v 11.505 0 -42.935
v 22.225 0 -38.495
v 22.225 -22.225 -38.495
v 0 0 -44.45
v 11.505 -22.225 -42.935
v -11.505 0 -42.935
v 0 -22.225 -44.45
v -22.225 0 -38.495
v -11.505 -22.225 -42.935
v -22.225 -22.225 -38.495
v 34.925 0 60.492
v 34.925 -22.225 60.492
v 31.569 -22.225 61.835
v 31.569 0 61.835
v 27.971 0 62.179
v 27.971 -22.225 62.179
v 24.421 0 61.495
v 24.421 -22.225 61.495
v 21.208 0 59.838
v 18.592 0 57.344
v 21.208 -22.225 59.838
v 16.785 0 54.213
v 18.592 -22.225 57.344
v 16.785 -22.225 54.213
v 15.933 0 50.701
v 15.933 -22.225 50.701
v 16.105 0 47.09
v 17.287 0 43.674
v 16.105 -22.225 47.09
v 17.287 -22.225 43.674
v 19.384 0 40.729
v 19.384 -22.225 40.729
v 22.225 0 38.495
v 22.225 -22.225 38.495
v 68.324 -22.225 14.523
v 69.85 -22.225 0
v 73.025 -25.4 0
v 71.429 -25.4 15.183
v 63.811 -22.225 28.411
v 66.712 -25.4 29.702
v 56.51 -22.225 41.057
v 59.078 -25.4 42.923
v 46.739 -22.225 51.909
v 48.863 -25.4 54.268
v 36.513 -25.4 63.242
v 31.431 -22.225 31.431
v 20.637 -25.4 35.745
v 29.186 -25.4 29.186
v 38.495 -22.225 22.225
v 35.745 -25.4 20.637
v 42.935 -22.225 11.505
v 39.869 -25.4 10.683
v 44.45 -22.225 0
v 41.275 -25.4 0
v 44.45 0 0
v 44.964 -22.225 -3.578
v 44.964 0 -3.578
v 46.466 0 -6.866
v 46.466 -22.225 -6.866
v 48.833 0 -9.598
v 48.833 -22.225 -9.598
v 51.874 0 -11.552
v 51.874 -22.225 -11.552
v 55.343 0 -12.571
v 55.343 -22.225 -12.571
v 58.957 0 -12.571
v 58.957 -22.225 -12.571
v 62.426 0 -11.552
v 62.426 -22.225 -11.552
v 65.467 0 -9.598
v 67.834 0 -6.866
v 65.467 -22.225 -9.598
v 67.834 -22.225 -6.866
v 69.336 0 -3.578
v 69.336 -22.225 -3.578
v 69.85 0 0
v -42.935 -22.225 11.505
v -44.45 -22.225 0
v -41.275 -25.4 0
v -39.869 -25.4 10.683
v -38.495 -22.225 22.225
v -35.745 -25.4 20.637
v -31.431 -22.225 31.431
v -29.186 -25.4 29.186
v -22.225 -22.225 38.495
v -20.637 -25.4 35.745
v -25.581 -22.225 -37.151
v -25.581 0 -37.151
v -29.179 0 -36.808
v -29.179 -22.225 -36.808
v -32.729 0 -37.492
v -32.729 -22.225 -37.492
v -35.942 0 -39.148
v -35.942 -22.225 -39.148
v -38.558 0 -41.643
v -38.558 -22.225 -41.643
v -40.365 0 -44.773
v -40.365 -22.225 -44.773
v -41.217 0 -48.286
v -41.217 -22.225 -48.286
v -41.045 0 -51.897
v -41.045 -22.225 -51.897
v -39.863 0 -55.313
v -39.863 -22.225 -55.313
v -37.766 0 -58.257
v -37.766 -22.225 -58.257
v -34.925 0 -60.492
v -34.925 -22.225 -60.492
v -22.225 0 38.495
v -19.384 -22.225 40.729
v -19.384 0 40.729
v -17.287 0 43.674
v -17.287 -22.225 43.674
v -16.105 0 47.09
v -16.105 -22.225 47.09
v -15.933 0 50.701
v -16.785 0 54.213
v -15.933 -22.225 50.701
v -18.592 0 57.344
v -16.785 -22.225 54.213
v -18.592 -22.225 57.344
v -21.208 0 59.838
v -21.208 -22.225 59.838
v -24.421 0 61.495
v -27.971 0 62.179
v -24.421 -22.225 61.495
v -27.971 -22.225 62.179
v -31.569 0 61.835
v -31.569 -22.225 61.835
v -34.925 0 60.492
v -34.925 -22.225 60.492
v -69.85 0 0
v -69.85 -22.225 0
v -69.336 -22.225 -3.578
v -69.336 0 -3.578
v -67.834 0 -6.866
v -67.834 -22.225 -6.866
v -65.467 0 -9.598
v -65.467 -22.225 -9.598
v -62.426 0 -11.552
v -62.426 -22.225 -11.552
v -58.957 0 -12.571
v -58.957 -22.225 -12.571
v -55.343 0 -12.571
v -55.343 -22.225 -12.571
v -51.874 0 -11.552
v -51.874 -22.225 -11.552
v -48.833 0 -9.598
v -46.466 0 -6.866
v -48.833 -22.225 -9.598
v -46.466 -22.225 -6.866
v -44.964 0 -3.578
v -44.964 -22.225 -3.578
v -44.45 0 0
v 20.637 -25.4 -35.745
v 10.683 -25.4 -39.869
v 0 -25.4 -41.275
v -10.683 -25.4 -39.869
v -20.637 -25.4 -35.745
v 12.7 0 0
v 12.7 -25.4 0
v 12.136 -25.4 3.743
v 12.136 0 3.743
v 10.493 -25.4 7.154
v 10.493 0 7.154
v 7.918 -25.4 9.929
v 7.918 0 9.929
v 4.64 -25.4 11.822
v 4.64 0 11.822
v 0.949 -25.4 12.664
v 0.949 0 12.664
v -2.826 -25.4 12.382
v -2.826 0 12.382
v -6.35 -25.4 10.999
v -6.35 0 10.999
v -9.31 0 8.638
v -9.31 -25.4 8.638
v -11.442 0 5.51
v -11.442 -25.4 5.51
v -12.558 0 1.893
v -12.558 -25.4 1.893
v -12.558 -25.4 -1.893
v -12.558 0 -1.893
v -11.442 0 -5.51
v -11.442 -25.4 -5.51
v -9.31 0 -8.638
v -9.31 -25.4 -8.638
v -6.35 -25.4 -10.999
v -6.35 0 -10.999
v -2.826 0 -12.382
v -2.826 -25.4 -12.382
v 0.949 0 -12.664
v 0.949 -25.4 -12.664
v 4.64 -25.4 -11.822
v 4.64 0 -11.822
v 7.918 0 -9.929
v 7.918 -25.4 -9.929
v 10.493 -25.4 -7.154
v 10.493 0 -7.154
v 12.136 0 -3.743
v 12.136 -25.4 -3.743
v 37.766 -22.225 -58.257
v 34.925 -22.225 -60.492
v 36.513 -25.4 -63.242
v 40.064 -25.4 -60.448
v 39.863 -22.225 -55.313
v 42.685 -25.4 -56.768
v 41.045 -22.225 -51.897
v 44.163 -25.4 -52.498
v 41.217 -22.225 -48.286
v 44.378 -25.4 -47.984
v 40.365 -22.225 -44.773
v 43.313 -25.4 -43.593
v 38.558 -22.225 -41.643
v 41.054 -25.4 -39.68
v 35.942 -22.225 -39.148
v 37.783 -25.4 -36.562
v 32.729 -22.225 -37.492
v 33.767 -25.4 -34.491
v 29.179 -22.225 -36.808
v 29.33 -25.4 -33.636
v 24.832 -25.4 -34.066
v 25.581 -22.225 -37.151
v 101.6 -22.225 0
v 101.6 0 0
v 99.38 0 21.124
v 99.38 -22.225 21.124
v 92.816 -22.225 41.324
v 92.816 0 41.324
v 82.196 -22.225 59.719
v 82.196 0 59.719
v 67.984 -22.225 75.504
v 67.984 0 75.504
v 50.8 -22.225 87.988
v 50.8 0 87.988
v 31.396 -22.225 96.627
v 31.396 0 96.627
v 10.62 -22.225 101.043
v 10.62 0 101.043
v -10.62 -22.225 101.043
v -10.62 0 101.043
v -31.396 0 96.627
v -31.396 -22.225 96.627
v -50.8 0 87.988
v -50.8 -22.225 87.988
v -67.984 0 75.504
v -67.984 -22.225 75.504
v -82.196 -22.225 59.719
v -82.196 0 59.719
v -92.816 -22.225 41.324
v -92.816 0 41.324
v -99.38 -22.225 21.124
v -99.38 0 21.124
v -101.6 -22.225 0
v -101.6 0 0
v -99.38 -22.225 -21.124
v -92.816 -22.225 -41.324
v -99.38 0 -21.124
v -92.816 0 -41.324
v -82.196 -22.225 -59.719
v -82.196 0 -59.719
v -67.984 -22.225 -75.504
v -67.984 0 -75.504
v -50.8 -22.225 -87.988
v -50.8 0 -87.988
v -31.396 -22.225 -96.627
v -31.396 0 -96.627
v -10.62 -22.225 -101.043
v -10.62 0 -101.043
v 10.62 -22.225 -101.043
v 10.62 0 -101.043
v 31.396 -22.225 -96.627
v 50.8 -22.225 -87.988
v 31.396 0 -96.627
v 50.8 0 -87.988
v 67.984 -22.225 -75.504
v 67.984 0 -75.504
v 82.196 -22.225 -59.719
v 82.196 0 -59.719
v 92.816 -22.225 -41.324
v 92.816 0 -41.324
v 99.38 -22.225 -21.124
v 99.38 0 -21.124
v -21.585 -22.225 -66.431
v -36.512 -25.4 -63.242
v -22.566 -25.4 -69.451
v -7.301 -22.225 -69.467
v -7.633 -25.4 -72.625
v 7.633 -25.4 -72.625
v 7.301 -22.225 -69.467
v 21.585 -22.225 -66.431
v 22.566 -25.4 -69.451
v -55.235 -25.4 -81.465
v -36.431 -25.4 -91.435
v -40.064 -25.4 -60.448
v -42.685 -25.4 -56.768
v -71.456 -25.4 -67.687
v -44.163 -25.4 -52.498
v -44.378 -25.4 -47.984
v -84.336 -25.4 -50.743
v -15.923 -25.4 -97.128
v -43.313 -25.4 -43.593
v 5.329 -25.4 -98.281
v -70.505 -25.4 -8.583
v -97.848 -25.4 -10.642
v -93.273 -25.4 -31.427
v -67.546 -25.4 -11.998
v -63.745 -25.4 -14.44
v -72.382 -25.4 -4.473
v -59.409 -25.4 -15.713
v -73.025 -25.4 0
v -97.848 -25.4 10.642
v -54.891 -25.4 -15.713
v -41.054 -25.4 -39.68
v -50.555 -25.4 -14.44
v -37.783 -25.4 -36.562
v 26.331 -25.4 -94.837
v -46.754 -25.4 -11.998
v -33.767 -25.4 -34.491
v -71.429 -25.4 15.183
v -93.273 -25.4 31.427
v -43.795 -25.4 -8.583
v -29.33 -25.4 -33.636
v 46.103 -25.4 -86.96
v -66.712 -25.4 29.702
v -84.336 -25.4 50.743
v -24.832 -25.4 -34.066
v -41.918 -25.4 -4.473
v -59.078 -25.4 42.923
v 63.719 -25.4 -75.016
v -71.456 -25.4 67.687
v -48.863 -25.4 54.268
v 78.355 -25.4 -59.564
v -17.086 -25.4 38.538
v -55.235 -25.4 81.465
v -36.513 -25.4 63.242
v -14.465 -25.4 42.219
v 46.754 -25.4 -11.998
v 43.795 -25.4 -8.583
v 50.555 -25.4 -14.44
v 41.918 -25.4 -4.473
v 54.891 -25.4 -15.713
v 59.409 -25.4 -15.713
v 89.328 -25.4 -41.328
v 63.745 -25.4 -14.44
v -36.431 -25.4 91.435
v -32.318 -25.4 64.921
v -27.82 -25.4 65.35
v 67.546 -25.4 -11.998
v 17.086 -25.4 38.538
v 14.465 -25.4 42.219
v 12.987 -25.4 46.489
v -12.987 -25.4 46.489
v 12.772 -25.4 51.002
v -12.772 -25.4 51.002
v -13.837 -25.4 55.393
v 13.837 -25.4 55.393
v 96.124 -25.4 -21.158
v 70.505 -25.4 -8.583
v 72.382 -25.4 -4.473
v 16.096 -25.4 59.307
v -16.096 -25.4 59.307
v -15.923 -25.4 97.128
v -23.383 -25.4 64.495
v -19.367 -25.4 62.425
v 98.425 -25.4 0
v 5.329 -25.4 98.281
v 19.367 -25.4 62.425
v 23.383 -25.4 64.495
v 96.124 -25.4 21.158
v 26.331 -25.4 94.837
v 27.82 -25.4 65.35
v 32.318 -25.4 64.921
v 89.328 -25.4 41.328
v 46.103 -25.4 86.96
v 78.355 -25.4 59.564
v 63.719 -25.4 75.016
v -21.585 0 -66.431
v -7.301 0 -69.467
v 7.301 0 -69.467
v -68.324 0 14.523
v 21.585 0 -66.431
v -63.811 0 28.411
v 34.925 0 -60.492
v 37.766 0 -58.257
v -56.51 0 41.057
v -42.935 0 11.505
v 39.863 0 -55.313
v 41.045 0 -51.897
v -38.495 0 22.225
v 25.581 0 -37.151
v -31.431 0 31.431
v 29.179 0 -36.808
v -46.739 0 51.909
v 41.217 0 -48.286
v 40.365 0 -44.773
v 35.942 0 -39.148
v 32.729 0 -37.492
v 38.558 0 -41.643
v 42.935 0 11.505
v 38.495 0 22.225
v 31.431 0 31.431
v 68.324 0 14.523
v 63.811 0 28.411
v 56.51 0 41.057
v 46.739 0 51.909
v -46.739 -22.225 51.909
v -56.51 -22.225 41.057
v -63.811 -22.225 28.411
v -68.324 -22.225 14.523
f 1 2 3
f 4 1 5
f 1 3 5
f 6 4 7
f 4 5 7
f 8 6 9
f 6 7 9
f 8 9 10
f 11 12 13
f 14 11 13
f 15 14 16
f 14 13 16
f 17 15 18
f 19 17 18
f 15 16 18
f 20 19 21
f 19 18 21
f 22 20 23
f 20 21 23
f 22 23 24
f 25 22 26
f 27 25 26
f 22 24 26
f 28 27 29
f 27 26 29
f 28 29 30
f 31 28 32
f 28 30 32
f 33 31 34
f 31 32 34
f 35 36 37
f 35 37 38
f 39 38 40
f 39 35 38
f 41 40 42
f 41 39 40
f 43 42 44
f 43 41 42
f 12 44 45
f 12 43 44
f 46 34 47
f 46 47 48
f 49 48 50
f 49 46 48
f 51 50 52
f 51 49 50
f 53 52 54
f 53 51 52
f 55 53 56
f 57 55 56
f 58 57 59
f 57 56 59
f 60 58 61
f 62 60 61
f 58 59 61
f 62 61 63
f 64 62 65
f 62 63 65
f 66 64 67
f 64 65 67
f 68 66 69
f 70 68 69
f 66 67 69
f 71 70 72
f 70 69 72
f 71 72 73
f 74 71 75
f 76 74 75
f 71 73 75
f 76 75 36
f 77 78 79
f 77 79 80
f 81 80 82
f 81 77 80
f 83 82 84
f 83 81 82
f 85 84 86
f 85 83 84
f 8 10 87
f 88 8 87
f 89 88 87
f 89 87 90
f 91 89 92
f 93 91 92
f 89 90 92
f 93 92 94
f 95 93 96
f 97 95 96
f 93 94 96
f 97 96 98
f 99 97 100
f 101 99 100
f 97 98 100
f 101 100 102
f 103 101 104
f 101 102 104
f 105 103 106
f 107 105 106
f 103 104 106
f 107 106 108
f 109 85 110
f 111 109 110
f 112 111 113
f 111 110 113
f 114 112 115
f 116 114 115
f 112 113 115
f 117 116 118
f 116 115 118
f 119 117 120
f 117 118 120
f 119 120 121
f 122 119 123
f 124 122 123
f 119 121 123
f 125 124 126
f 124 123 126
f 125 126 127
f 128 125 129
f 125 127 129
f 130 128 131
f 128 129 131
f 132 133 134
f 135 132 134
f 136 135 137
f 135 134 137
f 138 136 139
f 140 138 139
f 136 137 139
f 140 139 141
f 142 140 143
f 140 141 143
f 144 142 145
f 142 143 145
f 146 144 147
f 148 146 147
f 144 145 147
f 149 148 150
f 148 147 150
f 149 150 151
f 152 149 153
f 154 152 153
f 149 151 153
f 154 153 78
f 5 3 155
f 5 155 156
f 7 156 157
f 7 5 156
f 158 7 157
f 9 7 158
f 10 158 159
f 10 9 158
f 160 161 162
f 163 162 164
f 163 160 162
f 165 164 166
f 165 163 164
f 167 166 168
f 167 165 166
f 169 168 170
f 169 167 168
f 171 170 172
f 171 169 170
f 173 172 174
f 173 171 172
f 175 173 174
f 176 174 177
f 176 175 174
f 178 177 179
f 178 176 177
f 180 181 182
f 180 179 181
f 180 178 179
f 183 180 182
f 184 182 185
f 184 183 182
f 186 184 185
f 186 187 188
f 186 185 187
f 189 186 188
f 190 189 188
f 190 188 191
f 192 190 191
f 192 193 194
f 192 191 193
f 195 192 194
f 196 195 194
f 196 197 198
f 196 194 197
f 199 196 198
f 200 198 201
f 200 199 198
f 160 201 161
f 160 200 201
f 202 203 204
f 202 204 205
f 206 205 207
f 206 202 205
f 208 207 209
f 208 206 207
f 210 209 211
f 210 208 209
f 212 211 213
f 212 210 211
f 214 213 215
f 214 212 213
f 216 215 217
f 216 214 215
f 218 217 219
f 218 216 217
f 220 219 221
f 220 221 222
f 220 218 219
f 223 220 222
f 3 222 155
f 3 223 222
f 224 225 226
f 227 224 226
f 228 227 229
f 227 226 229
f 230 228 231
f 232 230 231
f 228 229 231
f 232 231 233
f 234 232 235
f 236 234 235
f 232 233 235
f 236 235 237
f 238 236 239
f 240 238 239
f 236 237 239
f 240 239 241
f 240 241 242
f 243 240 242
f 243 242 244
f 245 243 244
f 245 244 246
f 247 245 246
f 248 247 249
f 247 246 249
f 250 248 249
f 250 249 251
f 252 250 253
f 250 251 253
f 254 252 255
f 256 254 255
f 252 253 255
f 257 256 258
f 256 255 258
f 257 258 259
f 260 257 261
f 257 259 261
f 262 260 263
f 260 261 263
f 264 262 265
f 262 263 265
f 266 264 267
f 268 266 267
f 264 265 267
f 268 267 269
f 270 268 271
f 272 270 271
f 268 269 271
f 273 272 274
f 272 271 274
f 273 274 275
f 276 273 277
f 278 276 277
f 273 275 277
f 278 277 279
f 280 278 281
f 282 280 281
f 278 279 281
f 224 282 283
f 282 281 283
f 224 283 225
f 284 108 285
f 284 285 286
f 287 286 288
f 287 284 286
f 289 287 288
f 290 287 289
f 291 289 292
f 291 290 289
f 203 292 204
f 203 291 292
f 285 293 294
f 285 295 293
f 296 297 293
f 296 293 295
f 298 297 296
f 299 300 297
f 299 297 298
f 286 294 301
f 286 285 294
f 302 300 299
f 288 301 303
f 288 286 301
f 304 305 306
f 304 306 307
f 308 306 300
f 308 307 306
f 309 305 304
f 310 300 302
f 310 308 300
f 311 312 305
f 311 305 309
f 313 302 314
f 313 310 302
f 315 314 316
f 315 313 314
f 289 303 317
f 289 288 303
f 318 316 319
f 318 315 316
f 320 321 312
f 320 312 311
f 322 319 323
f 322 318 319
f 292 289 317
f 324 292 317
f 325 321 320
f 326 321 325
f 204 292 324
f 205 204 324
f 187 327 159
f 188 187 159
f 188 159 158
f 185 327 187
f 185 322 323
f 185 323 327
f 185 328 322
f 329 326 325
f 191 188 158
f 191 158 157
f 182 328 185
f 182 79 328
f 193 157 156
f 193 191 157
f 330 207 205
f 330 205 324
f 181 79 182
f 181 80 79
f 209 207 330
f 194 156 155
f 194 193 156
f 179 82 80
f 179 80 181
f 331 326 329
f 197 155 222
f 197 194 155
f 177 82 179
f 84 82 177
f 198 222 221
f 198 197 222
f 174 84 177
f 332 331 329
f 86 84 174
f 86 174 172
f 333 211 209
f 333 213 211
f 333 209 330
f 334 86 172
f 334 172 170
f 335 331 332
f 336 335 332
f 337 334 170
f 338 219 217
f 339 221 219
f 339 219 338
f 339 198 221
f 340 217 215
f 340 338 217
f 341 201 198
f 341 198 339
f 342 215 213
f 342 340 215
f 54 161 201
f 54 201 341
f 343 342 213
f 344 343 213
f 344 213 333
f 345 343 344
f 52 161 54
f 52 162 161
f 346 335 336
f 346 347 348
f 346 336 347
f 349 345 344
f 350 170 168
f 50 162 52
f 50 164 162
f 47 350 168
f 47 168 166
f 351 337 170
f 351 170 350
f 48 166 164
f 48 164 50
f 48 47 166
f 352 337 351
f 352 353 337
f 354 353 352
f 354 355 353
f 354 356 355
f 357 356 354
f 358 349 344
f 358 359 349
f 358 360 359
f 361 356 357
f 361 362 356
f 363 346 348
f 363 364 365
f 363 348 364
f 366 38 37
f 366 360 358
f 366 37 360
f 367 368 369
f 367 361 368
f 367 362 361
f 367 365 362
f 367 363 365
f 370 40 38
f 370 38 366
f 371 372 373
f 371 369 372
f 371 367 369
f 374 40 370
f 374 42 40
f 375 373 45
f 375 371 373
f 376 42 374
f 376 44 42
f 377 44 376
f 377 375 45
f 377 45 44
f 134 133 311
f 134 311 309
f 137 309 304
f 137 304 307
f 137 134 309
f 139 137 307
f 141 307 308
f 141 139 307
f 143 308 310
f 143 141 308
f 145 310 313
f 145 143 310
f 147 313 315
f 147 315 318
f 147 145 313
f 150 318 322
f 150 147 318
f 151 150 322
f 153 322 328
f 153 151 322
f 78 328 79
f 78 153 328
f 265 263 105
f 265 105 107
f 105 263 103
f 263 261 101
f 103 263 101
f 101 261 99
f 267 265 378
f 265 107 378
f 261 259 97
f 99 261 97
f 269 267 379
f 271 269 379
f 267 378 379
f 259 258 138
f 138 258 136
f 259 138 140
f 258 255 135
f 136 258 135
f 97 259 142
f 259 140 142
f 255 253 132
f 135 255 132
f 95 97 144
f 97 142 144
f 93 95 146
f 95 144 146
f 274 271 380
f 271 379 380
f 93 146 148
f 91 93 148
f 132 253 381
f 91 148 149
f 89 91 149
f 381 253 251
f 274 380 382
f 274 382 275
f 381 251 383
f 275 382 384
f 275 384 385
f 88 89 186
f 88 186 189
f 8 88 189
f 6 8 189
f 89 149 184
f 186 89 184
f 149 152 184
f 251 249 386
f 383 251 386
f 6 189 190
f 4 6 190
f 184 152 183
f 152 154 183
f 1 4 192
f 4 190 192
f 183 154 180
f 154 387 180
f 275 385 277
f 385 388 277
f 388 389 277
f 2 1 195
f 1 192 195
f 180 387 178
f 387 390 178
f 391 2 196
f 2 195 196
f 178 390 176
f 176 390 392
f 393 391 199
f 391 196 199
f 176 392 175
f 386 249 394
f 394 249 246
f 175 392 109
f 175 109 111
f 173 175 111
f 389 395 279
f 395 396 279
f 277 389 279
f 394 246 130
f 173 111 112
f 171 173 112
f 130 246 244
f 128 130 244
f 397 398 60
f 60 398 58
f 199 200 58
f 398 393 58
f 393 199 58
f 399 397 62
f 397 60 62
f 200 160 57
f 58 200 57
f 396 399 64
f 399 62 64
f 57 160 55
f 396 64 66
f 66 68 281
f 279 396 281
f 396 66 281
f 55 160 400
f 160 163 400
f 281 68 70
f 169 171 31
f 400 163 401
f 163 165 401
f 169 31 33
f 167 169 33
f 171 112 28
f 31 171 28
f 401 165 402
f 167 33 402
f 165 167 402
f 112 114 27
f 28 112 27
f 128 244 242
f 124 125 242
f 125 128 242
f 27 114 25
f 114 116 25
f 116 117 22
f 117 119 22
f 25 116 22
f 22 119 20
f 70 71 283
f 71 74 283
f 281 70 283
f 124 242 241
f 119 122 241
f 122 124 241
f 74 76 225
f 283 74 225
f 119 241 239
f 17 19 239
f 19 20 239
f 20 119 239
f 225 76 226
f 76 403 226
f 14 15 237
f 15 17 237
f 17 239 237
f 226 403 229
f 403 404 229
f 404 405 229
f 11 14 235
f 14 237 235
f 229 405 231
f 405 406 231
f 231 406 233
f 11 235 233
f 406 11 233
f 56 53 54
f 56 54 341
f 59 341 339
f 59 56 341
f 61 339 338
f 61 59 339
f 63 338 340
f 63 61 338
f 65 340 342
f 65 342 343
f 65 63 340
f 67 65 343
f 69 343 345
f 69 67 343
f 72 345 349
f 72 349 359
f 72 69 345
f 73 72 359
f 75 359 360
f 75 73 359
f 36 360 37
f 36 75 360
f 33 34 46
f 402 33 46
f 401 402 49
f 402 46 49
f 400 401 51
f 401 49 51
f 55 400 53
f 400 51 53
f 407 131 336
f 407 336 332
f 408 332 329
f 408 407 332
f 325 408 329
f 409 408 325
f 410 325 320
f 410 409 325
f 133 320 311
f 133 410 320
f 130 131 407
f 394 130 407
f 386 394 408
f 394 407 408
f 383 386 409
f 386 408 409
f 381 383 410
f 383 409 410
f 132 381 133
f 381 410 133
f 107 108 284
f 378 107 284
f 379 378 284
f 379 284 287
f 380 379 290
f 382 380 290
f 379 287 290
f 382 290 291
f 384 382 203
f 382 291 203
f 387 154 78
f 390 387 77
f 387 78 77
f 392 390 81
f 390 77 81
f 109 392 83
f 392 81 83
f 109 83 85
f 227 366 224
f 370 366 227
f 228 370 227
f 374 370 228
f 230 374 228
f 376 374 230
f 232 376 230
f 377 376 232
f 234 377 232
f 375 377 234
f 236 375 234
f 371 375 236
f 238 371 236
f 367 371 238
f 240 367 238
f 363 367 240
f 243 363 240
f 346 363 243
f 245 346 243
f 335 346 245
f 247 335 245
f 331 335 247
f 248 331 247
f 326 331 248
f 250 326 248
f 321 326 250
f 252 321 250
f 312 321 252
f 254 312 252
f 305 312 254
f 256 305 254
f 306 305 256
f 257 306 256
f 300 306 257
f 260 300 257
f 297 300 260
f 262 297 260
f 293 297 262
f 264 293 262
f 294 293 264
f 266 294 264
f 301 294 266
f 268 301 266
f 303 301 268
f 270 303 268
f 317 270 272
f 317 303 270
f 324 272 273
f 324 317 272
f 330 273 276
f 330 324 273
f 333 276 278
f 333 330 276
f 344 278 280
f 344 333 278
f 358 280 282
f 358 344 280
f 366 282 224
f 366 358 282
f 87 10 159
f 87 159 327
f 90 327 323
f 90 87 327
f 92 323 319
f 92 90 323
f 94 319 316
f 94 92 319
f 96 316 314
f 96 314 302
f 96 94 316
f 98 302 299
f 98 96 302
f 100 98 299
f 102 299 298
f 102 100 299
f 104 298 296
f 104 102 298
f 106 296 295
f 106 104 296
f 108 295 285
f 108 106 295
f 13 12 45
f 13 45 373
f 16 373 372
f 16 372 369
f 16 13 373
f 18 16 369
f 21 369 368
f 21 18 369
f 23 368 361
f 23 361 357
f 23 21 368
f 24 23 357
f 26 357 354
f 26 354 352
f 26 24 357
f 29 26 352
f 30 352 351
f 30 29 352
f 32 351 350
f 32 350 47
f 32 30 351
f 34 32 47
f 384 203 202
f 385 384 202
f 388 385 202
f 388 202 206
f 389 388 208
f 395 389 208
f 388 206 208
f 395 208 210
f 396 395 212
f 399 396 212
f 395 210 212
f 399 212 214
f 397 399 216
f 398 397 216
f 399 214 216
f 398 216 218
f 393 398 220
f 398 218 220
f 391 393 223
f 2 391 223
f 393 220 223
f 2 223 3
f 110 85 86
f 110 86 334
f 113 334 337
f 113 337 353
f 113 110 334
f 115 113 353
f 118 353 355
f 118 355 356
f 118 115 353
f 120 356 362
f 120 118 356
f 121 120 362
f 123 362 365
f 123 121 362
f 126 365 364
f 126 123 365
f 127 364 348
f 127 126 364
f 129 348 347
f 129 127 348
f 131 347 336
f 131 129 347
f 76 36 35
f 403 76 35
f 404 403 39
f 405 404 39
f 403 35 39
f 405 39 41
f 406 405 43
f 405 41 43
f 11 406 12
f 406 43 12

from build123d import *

# Parameters (mm, degrees)
F0_R     = 101.6
F2_DEPTH = 25.4
F1_R     = 12.7
F3_DEPTH = 25.401
F5_DEPTH = 25.401
F6_SIZE  = 3.175


with BuildPart() as f2:
    # F0 (on Front) → F2 (new body)
    with BuildSketch(Plane.XZ):
        Circle(F0_R)
    extrude(amount=F2_DEPTH)

    # F1 (on Front) → F3 (cut, through all)
    with BuildSketch(Plane.XZ):
        Circle(F1_R)
    extrude(amount=F3_DEPTH, mode=Mode.SUBTRACT)

    # F4 (on face) → F5 (cut, through all)
    with BuildSketch(Plane.XZ.offset(25.4)):
        with BuildLine():
            ThreePointArc((22.225, 38.494829), (38.494829, 22.225), (44.45, 0))
            ThreePointArc((44.45, 0), (57.15, -12.7), (69.85, 0))
            ThreePointArc((69.85, 0), (60.491874, 34.925), (34.925, 60.491874))
            ThreePointArc((34.925, 60.491874), (17.576477, 55.843352), (22.225, 38.494829))
        make_face()
        with BuildLine():
            ThreePointArc((-44.45, 0), (-38.494829, 22.225), (-22.225, 38.494829))
            ThreePointArc((-22.225, 38.494829), (-17.576477, 55.843352), (-34.925, 60.491874))
            ThreePointArc((-34.925, 60.491874), (-60.491874, 34.925), (-69.85, 0))
            ThreePointArc((-69.85, 0), (-57.15, -12.7), (-44.45, 0))
        make_face()
        with BuildLine():
            ThreePointArc((22.225, -38.494829), (0, -44.45), (-22.225, -38.494829))
            ThreePointArc((-22.225, -38.494829), (-39.573523, -43.143352), (-34.925, -60.491874))
            ThreePointArc((-34.925, -60.491874), (0, -69.85), (34.925, -60.491874))
            ThreePointArc((34.925, -60.491874), (39.573523, -43.143352), (22.225, -38.494829))
        make_face()
    extrude(amount=-F5_DEPTH, mode=Mode.SUBTRACT)

    # F6
    f6_edges = [f2.edges().sort_by_distance(p)[0] for p in [
        (-101.6, -25.4, 0),
        (-60.491874, -25.4, 34.925),
        (38.494829, -25.4, 22.225),
        (0, -25.4, -44.45),
    ]]
    chamfer(f6_edges, length=F6_SIZE)


solid = f2.part
